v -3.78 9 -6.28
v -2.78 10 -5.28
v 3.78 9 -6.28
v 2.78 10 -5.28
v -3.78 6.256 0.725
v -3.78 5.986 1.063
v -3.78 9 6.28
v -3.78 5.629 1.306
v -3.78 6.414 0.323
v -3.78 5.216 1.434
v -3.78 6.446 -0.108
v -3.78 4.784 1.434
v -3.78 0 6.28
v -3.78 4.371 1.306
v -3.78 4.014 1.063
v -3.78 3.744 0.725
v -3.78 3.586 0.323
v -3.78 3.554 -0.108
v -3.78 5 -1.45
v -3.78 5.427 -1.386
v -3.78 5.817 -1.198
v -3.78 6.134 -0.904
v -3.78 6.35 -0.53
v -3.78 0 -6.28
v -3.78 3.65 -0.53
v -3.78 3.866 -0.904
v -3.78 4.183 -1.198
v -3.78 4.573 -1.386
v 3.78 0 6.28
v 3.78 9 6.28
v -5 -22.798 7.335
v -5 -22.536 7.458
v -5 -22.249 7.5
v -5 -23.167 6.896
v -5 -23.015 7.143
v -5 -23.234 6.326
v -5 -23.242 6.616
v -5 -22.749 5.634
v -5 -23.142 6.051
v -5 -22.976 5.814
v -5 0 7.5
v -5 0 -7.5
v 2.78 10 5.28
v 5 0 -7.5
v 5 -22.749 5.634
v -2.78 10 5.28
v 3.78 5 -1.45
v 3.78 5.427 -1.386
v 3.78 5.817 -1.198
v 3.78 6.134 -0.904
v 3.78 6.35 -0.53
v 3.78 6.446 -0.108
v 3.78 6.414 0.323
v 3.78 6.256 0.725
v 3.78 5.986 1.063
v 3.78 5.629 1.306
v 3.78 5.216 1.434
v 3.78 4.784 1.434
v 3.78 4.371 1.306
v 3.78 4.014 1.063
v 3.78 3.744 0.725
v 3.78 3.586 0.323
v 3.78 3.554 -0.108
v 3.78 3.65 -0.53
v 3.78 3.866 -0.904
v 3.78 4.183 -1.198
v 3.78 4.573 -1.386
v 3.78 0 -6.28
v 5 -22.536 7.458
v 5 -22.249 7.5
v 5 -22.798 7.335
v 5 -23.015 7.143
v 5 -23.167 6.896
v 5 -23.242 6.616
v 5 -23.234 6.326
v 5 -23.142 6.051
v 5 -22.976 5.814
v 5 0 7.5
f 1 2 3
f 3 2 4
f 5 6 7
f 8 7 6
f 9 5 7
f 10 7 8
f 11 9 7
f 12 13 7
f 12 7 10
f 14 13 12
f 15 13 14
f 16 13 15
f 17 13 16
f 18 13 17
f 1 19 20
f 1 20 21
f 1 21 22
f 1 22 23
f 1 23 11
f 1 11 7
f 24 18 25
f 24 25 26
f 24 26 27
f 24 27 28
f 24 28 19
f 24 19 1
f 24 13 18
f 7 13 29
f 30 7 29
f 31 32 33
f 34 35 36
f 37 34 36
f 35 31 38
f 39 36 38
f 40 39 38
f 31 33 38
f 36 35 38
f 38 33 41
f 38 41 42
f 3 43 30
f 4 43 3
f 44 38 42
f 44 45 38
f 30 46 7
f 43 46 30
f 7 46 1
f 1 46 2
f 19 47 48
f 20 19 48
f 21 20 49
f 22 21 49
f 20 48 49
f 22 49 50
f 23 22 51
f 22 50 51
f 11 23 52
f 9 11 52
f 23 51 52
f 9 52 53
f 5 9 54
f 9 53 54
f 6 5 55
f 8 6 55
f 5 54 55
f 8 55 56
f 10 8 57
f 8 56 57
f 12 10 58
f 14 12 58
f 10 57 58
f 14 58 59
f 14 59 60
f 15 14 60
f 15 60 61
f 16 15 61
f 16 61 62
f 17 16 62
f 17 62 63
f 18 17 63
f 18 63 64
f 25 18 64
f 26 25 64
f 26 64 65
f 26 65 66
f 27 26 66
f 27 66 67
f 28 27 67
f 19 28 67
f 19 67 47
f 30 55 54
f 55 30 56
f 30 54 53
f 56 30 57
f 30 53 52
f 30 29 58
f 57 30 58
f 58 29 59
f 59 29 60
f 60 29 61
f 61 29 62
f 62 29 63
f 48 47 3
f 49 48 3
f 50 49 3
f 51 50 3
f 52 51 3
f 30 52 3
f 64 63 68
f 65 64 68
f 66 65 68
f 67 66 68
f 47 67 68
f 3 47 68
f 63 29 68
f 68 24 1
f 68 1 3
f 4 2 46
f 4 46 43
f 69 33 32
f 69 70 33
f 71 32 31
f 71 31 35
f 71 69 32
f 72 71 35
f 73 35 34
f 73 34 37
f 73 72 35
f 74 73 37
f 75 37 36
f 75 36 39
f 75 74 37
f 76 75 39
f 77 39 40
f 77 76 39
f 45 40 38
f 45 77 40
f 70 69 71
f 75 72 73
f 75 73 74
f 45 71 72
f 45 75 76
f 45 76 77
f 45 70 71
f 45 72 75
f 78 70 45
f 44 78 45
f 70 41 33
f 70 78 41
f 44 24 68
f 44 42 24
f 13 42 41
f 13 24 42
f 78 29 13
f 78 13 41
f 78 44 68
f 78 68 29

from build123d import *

# Parameters (mm, degrees)
SKETCH_1_W          = 7.56
SKETCH_1_H          = 12.56
EXTRUDE_1_DEPTH     = 10
CHAMFER_1_SIZE      = 1
EXTRUDE_2_DEPTH     = 5
SKETCH_4_R          = 1.45
CUT_EXTRUDE_1_DEPTH = 10
FILLET_1_R          = 1


with BuildPart() as part:
    # ｽｹｯﾁ1 → ﾎﾞｽ - 押し出し1 (new body)
    with BuildSketch(Plane(origin=(0, 0, 0), x_dir=(1, 0, 0), z_dir=(0, 1, 0))):
        Rectangle(SKETCH_1_W, SKETCH_1_H)
    extrude(amount=EXTRUDE_1_DEPTH)

    # 面取り1
    chamfer_1_edges = [part.edges().sort_by_distance(p)[0] for p in [
        (3.78, 10, 0),
        (0, 10, -6.28),
        (-3.78, 10, 0),
        (0, 10, 6.28),
    ]]
    chamfer(chamfer_1_edges, length=CHAMFER_1_SIZE)

    # ｽｹｯﾁ3 → ﾎﾞｽ - 押し出し2 (add, symmetric)
    with BuildSketch(Plane(origin=(0, 0, 0), x_dir=(0, 0, -1), z_dir=(1, 0, 0))):
        Polygon((0, 0), (-6.28, 0), (-7.5, 0), (-7.5, -25.980762114), (7.5, 0), (6.28, 0), align=None)
    extrude(amount=EXTRUDE_2_DEPTH, both=True)

    # ｽｹｯﾁ4 → ｶｯﾄ - 押し出し1 (cut)
    with BuildSketch(Plane(origin=(3.78, 0, 0), x_dir=(0, 0, -1), z_dir=(1, 0, 0))):
        with Locations((0, 5)):
            Circle(SKETCH_4_R)
    extrude(amount=-CUT_EXTRUDE_1_DEPTH, mode=Mode.SUBTRACT)

    # ﾌｨﾚｯﾄ1
    fillet_1_edges = [part.edges().sort_by_distance(p)[0] for p in [
        (0, -25.980762114, 7.5),
    ]]
    fillet(fillet_1_edges, radius=FILLET_1_R)


solid = part.part
